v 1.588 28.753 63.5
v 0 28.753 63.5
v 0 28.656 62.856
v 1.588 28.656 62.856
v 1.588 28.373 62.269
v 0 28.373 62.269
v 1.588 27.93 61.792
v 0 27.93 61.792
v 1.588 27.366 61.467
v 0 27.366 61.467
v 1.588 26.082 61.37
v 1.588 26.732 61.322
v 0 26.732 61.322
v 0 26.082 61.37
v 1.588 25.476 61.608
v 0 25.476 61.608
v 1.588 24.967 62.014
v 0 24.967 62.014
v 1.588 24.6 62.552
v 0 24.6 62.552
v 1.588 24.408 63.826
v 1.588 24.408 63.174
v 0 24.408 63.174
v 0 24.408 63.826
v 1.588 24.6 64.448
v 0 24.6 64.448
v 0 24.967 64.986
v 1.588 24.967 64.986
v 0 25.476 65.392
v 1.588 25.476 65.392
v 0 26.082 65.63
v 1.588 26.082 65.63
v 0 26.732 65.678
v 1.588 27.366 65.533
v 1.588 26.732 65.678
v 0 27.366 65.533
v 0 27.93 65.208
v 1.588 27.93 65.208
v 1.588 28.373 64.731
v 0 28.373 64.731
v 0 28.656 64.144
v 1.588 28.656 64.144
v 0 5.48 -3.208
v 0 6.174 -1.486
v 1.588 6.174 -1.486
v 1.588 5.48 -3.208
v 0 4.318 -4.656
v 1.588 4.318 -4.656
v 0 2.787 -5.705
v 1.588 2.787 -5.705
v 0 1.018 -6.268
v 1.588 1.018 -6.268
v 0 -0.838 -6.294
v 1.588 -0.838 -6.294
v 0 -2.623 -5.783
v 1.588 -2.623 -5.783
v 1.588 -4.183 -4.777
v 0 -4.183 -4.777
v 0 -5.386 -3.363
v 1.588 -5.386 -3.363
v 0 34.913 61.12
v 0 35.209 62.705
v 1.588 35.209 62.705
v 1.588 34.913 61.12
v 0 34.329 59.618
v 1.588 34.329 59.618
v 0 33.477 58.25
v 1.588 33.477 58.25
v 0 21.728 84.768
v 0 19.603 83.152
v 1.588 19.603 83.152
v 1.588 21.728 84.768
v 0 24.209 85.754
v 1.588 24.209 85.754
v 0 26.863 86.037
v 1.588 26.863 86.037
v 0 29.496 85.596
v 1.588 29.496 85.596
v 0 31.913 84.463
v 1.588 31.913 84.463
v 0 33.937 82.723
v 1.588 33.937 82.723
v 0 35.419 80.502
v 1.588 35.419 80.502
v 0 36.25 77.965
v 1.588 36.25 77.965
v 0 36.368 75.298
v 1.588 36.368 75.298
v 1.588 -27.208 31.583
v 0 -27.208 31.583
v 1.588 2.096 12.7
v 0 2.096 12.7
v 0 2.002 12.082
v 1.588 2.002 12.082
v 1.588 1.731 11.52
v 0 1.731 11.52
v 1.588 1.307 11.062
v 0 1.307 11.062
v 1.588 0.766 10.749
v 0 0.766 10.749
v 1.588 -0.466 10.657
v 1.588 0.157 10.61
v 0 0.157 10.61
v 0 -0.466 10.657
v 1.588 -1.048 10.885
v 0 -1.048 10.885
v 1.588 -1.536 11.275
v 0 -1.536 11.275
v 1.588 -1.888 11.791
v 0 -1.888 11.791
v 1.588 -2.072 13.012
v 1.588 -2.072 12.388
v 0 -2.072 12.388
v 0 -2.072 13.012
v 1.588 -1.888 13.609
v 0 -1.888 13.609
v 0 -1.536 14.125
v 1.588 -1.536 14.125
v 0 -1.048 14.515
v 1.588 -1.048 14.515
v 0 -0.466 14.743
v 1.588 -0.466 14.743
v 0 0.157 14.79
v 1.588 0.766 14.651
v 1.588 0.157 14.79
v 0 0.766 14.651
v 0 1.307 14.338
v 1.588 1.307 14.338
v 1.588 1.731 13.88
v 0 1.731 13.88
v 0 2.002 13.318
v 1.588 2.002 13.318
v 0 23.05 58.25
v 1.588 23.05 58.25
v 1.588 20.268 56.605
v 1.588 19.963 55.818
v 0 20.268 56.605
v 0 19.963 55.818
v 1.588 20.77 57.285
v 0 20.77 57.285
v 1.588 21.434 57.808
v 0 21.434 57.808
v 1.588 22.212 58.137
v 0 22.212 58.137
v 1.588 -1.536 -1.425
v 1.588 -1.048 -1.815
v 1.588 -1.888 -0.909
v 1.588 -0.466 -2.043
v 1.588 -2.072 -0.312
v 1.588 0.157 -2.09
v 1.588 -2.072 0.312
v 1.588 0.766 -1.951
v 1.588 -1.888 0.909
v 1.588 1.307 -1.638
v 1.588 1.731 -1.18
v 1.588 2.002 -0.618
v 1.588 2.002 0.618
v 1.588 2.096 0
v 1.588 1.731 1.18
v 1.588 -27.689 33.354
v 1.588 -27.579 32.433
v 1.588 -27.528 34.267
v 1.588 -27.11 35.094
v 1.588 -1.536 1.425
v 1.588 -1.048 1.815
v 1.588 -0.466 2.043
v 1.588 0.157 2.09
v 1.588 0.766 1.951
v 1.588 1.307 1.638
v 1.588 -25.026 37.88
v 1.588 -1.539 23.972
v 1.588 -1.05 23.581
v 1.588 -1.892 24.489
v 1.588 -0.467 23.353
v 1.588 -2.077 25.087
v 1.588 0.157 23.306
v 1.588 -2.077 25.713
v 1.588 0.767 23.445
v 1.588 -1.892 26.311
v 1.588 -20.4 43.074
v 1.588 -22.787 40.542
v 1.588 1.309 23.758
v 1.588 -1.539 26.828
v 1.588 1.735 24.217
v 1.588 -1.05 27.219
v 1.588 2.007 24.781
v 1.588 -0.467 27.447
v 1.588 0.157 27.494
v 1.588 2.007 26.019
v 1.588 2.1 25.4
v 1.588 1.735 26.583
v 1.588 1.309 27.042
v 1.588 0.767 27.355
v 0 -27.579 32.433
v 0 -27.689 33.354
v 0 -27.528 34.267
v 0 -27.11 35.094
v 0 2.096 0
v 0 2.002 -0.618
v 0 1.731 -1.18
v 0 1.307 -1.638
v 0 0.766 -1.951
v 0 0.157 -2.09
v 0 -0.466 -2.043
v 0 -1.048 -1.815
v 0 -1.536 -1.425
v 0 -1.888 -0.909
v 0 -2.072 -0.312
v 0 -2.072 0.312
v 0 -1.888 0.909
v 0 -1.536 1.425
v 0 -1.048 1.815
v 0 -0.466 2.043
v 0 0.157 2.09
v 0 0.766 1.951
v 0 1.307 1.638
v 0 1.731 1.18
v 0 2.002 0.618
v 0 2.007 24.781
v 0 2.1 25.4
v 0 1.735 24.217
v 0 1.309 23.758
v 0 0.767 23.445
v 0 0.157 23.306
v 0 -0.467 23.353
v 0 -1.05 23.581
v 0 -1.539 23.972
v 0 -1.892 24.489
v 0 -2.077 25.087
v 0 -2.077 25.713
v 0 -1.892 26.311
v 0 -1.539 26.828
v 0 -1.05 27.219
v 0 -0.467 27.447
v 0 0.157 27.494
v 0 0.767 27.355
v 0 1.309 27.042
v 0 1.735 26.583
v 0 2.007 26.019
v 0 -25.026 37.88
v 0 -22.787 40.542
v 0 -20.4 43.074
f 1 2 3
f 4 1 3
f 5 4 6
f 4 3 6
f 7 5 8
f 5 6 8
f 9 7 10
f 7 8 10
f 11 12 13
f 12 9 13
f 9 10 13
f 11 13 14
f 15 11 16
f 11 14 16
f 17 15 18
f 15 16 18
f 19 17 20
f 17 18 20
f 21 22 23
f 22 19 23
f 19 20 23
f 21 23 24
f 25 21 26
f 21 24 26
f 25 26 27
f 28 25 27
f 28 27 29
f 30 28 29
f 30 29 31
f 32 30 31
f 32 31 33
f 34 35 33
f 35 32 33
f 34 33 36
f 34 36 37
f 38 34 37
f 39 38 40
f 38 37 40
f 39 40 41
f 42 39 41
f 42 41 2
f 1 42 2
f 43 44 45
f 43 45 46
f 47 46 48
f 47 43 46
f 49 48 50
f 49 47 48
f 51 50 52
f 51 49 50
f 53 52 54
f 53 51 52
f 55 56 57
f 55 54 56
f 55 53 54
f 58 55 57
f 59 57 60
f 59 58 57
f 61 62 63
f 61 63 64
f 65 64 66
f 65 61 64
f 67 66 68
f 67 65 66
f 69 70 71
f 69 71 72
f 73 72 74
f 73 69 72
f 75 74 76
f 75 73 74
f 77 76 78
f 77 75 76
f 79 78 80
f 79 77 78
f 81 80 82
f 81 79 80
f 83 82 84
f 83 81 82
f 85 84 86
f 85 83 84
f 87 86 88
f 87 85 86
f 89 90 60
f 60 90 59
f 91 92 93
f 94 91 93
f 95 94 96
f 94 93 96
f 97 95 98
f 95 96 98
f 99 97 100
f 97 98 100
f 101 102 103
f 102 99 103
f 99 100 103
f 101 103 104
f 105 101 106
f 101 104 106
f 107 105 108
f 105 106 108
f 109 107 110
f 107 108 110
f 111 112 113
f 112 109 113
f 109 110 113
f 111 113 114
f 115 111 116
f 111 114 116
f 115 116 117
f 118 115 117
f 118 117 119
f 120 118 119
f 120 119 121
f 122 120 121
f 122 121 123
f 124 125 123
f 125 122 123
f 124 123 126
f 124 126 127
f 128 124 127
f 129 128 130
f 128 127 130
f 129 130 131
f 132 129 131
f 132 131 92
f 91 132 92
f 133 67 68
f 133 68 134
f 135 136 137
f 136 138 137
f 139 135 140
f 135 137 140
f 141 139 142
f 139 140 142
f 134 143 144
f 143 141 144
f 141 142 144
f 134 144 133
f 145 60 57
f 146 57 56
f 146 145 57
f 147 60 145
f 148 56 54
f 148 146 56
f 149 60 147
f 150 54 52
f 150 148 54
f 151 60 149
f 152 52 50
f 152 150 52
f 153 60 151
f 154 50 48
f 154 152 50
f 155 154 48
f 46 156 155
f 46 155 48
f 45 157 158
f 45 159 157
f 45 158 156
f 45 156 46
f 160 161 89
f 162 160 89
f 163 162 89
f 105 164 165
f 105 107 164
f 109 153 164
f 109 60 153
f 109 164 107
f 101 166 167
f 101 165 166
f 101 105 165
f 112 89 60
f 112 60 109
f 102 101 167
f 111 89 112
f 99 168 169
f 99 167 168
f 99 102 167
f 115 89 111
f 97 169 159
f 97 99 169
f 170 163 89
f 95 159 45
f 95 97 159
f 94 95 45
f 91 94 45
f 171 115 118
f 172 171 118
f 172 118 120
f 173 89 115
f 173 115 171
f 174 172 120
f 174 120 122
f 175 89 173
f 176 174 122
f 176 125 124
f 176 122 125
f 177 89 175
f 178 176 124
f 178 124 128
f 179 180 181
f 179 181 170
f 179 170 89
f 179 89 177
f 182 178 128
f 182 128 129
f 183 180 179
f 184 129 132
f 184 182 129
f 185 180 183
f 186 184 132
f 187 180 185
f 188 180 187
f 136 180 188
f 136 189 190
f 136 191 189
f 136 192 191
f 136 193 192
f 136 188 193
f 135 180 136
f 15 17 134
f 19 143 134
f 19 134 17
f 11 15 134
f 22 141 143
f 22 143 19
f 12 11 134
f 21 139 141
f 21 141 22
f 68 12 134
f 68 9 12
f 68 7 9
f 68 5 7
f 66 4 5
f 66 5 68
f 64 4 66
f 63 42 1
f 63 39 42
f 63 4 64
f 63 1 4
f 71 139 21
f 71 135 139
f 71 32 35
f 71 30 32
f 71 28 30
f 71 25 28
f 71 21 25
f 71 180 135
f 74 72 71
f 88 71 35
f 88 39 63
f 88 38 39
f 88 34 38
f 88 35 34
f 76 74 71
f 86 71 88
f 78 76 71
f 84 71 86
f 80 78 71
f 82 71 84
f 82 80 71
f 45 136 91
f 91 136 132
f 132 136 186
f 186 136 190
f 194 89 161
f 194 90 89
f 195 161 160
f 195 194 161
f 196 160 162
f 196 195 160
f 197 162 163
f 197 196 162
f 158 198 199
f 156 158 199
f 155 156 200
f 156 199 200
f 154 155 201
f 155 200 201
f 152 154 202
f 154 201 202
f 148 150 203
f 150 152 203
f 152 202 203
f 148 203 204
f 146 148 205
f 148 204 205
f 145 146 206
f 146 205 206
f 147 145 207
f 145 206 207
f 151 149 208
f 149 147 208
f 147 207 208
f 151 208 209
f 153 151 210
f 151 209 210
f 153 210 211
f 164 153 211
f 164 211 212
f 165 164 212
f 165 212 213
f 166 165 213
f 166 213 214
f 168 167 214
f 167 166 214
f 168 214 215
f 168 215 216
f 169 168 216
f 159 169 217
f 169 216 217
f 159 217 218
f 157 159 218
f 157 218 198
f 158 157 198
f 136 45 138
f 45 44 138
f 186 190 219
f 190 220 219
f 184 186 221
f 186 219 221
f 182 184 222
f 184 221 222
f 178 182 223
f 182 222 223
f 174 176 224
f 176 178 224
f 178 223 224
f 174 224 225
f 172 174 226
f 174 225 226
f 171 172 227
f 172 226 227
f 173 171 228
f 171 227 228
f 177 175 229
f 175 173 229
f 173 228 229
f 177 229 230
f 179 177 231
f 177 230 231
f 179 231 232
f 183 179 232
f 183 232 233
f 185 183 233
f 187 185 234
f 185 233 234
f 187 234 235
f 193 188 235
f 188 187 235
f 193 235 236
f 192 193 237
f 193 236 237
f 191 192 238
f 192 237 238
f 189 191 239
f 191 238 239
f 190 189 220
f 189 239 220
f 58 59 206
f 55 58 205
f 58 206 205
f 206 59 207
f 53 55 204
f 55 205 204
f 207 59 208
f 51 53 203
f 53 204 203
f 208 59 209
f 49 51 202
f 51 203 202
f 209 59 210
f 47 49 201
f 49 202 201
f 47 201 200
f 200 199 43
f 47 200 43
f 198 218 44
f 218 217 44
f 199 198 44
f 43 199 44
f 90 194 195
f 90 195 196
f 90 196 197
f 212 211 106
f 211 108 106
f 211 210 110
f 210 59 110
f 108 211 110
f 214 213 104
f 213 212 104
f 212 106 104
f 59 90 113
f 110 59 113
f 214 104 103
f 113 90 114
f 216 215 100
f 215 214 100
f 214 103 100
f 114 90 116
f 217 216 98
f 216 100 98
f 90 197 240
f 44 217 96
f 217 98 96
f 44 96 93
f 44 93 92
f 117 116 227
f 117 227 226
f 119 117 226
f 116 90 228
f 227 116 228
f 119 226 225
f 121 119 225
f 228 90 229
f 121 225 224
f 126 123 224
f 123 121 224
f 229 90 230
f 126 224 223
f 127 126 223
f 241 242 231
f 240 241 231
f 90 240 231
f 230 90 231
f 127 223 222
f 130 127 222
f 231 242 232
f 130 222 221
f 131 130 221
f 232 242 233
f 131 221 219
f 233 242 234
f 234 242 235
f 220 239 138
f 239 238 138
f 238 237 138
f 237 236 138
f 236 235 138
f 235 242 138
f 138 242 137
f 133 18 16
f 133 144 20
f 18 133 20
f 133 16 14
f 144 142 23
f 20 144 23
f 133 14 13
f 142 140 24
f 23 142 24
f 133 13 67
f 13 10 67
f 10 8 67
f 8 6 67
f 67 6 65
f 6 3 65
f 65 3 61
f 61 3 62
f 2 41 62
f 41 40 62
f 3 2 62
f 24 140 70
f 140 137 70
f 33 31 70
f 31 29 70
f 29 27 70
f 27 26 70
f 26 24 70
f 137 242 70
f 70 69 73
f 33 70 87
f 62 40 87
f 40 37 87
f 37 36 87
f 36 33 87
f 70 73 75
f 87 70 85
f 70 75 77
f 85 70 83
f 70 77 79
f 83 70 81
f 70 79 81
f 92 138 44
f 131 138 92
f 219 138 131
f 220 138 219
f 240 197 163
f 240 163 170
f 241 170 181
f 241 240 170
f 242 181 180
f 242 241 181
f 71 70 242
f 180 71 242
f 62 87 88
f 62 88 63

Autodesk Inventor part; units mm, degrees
ref_plane "YZ Plane" through (0, 0, 0) normal (1, 0, 0) x (0, 1, 0)
ref_plane "XZ Plane" through (0, 0, 0) normal (0, 1, 0) x (-1, 0, 0)
ref_plane "XY Plane" through (0, 0, 0) normal (0, 0, 1) x (1, 0, 0)
sketch "main" plane through (0, 0, 0) normal (0, 0, 1) x (1, 0, 0)
  circle A0 centre (10.9635, 21.0817) radius 2.1
  circle A1 centre (10.9635, 21.0817) radius 2.0955
  arc A2 (31.3634, 3.4082) -> (38.0738, 11.3874) centre (-11.9899, 46.6796) ccw
  arc A3 (38.0738, 11.3874) -> (38.1719, 14.8984) centre (35.4788, 13.2167) ccw
  circle A4 centre (10.9635, 46.4817) radius 2.0955
  arc A5 (16.3496, 49.845) -> (4.7897, 47.9673) centre (10.9635, 46.4817) ccw
  line L0 (38.1719, 14.8984) -> (16.3496, 49.845)
  arc A6 (-25.4047, -28.8165) -> (-8.6396, -36.6705) centre (-15.6049, -29.7183) ccw
  line L1 (-8.6396, -36.6705) -> (31.3634, 3.4082)
  line L2 (-25.4047, -28.8165) -> (-24.2459, -16.2232)
  circle A7 centre (10.9635, 33.7817) radius 2.0955
  circle A8 centre (-15.6049, -17.0183) radius 2.1844
  arc A9 (-22.5138, -11.768) -> (-24.2459, -16.2232) centre (-15.6049, -17.0183) ccw
  line L3 (4.7897, 47.9673) -> (-8.9994, -9.3358)
  line L4 (-22.5138, -11.768) -> (-12.0863, -11.768)
  arc A10 (-12.0863, -11.768) -> (-8.9994, -9.3358) centre (-12.0863, -8.593) ccw
  point P0 (5.2874, 13.8034)
  point P1 (39.2673, 13.1442)
  dimension "d0" = 4.191
  dimension "d1" = 4.191
  dimension "d3" = 3.175
  dimension "d4" = 4.191
  dimension "d11" = 3.175
sketch "Sketch1" plane through (0, 0, 0) normal (1, 0, 0) x (0, 1, 0)
  circle A0 centre (0, 25.4) radius 2.1
  circle A1 centre (0, 25.4) radius 2.0955
  arc A2 (-20.3999, 43.0735) -> (-27.1104, 35.0943) centre (22.9534, -0.1979) ccw
  arc A3 (-27.1104, 35.0943) -> (-27.2084, 31.5833) centre (-24.5154, 33.265) ccw
  circle A4 centre (0, 0) radius 2.0955
  arc A5 (-5.3861, -3.3633) -> (6.1738, -1.4856) centre (0, 0) ccw
  line L0 (-27.2084, 31.5833) -> (-5.3861, -3.3633)
  arc A6 (36.3681, 75.2982) -> (19.603, 83.1522) centre (26.5684, 76.2) ccw
  line L1 (19.603, 83.1522) -> (-20.3999, 43.0735)
  line L2 (36.3681, 75.2982) -> (35.2093, 62.7049)
  circle A7 centre (0, 12.7) radius 2.0955
  circle A8 centre (26.5684, 63.5) radius 2.1844
  arc A9 (33.4773, 58.2497) -> (35.2093, 62.7049) centre (26.5684, 63.5) ccw
  line L3 (6.1738, -1.4856) -> (19.9628, 55.8175)
  line L4 (33.4773, 58.2497) -> (23.0497, 58.2497)
  arc A10 (23.0497, 58.2497) -> (19.9628, 55.8175) centre (23.0497, 55.0747) ccw
  point P0 (0, 0)
extrude "Extrusion1" add sketch "Sketch1" along normal blind 1.5875 contours L1 A6 L2 A9 L4 A10 L3 A5 L0 A3 A2
properties part number "sled" material "Acetal Resin, White"
